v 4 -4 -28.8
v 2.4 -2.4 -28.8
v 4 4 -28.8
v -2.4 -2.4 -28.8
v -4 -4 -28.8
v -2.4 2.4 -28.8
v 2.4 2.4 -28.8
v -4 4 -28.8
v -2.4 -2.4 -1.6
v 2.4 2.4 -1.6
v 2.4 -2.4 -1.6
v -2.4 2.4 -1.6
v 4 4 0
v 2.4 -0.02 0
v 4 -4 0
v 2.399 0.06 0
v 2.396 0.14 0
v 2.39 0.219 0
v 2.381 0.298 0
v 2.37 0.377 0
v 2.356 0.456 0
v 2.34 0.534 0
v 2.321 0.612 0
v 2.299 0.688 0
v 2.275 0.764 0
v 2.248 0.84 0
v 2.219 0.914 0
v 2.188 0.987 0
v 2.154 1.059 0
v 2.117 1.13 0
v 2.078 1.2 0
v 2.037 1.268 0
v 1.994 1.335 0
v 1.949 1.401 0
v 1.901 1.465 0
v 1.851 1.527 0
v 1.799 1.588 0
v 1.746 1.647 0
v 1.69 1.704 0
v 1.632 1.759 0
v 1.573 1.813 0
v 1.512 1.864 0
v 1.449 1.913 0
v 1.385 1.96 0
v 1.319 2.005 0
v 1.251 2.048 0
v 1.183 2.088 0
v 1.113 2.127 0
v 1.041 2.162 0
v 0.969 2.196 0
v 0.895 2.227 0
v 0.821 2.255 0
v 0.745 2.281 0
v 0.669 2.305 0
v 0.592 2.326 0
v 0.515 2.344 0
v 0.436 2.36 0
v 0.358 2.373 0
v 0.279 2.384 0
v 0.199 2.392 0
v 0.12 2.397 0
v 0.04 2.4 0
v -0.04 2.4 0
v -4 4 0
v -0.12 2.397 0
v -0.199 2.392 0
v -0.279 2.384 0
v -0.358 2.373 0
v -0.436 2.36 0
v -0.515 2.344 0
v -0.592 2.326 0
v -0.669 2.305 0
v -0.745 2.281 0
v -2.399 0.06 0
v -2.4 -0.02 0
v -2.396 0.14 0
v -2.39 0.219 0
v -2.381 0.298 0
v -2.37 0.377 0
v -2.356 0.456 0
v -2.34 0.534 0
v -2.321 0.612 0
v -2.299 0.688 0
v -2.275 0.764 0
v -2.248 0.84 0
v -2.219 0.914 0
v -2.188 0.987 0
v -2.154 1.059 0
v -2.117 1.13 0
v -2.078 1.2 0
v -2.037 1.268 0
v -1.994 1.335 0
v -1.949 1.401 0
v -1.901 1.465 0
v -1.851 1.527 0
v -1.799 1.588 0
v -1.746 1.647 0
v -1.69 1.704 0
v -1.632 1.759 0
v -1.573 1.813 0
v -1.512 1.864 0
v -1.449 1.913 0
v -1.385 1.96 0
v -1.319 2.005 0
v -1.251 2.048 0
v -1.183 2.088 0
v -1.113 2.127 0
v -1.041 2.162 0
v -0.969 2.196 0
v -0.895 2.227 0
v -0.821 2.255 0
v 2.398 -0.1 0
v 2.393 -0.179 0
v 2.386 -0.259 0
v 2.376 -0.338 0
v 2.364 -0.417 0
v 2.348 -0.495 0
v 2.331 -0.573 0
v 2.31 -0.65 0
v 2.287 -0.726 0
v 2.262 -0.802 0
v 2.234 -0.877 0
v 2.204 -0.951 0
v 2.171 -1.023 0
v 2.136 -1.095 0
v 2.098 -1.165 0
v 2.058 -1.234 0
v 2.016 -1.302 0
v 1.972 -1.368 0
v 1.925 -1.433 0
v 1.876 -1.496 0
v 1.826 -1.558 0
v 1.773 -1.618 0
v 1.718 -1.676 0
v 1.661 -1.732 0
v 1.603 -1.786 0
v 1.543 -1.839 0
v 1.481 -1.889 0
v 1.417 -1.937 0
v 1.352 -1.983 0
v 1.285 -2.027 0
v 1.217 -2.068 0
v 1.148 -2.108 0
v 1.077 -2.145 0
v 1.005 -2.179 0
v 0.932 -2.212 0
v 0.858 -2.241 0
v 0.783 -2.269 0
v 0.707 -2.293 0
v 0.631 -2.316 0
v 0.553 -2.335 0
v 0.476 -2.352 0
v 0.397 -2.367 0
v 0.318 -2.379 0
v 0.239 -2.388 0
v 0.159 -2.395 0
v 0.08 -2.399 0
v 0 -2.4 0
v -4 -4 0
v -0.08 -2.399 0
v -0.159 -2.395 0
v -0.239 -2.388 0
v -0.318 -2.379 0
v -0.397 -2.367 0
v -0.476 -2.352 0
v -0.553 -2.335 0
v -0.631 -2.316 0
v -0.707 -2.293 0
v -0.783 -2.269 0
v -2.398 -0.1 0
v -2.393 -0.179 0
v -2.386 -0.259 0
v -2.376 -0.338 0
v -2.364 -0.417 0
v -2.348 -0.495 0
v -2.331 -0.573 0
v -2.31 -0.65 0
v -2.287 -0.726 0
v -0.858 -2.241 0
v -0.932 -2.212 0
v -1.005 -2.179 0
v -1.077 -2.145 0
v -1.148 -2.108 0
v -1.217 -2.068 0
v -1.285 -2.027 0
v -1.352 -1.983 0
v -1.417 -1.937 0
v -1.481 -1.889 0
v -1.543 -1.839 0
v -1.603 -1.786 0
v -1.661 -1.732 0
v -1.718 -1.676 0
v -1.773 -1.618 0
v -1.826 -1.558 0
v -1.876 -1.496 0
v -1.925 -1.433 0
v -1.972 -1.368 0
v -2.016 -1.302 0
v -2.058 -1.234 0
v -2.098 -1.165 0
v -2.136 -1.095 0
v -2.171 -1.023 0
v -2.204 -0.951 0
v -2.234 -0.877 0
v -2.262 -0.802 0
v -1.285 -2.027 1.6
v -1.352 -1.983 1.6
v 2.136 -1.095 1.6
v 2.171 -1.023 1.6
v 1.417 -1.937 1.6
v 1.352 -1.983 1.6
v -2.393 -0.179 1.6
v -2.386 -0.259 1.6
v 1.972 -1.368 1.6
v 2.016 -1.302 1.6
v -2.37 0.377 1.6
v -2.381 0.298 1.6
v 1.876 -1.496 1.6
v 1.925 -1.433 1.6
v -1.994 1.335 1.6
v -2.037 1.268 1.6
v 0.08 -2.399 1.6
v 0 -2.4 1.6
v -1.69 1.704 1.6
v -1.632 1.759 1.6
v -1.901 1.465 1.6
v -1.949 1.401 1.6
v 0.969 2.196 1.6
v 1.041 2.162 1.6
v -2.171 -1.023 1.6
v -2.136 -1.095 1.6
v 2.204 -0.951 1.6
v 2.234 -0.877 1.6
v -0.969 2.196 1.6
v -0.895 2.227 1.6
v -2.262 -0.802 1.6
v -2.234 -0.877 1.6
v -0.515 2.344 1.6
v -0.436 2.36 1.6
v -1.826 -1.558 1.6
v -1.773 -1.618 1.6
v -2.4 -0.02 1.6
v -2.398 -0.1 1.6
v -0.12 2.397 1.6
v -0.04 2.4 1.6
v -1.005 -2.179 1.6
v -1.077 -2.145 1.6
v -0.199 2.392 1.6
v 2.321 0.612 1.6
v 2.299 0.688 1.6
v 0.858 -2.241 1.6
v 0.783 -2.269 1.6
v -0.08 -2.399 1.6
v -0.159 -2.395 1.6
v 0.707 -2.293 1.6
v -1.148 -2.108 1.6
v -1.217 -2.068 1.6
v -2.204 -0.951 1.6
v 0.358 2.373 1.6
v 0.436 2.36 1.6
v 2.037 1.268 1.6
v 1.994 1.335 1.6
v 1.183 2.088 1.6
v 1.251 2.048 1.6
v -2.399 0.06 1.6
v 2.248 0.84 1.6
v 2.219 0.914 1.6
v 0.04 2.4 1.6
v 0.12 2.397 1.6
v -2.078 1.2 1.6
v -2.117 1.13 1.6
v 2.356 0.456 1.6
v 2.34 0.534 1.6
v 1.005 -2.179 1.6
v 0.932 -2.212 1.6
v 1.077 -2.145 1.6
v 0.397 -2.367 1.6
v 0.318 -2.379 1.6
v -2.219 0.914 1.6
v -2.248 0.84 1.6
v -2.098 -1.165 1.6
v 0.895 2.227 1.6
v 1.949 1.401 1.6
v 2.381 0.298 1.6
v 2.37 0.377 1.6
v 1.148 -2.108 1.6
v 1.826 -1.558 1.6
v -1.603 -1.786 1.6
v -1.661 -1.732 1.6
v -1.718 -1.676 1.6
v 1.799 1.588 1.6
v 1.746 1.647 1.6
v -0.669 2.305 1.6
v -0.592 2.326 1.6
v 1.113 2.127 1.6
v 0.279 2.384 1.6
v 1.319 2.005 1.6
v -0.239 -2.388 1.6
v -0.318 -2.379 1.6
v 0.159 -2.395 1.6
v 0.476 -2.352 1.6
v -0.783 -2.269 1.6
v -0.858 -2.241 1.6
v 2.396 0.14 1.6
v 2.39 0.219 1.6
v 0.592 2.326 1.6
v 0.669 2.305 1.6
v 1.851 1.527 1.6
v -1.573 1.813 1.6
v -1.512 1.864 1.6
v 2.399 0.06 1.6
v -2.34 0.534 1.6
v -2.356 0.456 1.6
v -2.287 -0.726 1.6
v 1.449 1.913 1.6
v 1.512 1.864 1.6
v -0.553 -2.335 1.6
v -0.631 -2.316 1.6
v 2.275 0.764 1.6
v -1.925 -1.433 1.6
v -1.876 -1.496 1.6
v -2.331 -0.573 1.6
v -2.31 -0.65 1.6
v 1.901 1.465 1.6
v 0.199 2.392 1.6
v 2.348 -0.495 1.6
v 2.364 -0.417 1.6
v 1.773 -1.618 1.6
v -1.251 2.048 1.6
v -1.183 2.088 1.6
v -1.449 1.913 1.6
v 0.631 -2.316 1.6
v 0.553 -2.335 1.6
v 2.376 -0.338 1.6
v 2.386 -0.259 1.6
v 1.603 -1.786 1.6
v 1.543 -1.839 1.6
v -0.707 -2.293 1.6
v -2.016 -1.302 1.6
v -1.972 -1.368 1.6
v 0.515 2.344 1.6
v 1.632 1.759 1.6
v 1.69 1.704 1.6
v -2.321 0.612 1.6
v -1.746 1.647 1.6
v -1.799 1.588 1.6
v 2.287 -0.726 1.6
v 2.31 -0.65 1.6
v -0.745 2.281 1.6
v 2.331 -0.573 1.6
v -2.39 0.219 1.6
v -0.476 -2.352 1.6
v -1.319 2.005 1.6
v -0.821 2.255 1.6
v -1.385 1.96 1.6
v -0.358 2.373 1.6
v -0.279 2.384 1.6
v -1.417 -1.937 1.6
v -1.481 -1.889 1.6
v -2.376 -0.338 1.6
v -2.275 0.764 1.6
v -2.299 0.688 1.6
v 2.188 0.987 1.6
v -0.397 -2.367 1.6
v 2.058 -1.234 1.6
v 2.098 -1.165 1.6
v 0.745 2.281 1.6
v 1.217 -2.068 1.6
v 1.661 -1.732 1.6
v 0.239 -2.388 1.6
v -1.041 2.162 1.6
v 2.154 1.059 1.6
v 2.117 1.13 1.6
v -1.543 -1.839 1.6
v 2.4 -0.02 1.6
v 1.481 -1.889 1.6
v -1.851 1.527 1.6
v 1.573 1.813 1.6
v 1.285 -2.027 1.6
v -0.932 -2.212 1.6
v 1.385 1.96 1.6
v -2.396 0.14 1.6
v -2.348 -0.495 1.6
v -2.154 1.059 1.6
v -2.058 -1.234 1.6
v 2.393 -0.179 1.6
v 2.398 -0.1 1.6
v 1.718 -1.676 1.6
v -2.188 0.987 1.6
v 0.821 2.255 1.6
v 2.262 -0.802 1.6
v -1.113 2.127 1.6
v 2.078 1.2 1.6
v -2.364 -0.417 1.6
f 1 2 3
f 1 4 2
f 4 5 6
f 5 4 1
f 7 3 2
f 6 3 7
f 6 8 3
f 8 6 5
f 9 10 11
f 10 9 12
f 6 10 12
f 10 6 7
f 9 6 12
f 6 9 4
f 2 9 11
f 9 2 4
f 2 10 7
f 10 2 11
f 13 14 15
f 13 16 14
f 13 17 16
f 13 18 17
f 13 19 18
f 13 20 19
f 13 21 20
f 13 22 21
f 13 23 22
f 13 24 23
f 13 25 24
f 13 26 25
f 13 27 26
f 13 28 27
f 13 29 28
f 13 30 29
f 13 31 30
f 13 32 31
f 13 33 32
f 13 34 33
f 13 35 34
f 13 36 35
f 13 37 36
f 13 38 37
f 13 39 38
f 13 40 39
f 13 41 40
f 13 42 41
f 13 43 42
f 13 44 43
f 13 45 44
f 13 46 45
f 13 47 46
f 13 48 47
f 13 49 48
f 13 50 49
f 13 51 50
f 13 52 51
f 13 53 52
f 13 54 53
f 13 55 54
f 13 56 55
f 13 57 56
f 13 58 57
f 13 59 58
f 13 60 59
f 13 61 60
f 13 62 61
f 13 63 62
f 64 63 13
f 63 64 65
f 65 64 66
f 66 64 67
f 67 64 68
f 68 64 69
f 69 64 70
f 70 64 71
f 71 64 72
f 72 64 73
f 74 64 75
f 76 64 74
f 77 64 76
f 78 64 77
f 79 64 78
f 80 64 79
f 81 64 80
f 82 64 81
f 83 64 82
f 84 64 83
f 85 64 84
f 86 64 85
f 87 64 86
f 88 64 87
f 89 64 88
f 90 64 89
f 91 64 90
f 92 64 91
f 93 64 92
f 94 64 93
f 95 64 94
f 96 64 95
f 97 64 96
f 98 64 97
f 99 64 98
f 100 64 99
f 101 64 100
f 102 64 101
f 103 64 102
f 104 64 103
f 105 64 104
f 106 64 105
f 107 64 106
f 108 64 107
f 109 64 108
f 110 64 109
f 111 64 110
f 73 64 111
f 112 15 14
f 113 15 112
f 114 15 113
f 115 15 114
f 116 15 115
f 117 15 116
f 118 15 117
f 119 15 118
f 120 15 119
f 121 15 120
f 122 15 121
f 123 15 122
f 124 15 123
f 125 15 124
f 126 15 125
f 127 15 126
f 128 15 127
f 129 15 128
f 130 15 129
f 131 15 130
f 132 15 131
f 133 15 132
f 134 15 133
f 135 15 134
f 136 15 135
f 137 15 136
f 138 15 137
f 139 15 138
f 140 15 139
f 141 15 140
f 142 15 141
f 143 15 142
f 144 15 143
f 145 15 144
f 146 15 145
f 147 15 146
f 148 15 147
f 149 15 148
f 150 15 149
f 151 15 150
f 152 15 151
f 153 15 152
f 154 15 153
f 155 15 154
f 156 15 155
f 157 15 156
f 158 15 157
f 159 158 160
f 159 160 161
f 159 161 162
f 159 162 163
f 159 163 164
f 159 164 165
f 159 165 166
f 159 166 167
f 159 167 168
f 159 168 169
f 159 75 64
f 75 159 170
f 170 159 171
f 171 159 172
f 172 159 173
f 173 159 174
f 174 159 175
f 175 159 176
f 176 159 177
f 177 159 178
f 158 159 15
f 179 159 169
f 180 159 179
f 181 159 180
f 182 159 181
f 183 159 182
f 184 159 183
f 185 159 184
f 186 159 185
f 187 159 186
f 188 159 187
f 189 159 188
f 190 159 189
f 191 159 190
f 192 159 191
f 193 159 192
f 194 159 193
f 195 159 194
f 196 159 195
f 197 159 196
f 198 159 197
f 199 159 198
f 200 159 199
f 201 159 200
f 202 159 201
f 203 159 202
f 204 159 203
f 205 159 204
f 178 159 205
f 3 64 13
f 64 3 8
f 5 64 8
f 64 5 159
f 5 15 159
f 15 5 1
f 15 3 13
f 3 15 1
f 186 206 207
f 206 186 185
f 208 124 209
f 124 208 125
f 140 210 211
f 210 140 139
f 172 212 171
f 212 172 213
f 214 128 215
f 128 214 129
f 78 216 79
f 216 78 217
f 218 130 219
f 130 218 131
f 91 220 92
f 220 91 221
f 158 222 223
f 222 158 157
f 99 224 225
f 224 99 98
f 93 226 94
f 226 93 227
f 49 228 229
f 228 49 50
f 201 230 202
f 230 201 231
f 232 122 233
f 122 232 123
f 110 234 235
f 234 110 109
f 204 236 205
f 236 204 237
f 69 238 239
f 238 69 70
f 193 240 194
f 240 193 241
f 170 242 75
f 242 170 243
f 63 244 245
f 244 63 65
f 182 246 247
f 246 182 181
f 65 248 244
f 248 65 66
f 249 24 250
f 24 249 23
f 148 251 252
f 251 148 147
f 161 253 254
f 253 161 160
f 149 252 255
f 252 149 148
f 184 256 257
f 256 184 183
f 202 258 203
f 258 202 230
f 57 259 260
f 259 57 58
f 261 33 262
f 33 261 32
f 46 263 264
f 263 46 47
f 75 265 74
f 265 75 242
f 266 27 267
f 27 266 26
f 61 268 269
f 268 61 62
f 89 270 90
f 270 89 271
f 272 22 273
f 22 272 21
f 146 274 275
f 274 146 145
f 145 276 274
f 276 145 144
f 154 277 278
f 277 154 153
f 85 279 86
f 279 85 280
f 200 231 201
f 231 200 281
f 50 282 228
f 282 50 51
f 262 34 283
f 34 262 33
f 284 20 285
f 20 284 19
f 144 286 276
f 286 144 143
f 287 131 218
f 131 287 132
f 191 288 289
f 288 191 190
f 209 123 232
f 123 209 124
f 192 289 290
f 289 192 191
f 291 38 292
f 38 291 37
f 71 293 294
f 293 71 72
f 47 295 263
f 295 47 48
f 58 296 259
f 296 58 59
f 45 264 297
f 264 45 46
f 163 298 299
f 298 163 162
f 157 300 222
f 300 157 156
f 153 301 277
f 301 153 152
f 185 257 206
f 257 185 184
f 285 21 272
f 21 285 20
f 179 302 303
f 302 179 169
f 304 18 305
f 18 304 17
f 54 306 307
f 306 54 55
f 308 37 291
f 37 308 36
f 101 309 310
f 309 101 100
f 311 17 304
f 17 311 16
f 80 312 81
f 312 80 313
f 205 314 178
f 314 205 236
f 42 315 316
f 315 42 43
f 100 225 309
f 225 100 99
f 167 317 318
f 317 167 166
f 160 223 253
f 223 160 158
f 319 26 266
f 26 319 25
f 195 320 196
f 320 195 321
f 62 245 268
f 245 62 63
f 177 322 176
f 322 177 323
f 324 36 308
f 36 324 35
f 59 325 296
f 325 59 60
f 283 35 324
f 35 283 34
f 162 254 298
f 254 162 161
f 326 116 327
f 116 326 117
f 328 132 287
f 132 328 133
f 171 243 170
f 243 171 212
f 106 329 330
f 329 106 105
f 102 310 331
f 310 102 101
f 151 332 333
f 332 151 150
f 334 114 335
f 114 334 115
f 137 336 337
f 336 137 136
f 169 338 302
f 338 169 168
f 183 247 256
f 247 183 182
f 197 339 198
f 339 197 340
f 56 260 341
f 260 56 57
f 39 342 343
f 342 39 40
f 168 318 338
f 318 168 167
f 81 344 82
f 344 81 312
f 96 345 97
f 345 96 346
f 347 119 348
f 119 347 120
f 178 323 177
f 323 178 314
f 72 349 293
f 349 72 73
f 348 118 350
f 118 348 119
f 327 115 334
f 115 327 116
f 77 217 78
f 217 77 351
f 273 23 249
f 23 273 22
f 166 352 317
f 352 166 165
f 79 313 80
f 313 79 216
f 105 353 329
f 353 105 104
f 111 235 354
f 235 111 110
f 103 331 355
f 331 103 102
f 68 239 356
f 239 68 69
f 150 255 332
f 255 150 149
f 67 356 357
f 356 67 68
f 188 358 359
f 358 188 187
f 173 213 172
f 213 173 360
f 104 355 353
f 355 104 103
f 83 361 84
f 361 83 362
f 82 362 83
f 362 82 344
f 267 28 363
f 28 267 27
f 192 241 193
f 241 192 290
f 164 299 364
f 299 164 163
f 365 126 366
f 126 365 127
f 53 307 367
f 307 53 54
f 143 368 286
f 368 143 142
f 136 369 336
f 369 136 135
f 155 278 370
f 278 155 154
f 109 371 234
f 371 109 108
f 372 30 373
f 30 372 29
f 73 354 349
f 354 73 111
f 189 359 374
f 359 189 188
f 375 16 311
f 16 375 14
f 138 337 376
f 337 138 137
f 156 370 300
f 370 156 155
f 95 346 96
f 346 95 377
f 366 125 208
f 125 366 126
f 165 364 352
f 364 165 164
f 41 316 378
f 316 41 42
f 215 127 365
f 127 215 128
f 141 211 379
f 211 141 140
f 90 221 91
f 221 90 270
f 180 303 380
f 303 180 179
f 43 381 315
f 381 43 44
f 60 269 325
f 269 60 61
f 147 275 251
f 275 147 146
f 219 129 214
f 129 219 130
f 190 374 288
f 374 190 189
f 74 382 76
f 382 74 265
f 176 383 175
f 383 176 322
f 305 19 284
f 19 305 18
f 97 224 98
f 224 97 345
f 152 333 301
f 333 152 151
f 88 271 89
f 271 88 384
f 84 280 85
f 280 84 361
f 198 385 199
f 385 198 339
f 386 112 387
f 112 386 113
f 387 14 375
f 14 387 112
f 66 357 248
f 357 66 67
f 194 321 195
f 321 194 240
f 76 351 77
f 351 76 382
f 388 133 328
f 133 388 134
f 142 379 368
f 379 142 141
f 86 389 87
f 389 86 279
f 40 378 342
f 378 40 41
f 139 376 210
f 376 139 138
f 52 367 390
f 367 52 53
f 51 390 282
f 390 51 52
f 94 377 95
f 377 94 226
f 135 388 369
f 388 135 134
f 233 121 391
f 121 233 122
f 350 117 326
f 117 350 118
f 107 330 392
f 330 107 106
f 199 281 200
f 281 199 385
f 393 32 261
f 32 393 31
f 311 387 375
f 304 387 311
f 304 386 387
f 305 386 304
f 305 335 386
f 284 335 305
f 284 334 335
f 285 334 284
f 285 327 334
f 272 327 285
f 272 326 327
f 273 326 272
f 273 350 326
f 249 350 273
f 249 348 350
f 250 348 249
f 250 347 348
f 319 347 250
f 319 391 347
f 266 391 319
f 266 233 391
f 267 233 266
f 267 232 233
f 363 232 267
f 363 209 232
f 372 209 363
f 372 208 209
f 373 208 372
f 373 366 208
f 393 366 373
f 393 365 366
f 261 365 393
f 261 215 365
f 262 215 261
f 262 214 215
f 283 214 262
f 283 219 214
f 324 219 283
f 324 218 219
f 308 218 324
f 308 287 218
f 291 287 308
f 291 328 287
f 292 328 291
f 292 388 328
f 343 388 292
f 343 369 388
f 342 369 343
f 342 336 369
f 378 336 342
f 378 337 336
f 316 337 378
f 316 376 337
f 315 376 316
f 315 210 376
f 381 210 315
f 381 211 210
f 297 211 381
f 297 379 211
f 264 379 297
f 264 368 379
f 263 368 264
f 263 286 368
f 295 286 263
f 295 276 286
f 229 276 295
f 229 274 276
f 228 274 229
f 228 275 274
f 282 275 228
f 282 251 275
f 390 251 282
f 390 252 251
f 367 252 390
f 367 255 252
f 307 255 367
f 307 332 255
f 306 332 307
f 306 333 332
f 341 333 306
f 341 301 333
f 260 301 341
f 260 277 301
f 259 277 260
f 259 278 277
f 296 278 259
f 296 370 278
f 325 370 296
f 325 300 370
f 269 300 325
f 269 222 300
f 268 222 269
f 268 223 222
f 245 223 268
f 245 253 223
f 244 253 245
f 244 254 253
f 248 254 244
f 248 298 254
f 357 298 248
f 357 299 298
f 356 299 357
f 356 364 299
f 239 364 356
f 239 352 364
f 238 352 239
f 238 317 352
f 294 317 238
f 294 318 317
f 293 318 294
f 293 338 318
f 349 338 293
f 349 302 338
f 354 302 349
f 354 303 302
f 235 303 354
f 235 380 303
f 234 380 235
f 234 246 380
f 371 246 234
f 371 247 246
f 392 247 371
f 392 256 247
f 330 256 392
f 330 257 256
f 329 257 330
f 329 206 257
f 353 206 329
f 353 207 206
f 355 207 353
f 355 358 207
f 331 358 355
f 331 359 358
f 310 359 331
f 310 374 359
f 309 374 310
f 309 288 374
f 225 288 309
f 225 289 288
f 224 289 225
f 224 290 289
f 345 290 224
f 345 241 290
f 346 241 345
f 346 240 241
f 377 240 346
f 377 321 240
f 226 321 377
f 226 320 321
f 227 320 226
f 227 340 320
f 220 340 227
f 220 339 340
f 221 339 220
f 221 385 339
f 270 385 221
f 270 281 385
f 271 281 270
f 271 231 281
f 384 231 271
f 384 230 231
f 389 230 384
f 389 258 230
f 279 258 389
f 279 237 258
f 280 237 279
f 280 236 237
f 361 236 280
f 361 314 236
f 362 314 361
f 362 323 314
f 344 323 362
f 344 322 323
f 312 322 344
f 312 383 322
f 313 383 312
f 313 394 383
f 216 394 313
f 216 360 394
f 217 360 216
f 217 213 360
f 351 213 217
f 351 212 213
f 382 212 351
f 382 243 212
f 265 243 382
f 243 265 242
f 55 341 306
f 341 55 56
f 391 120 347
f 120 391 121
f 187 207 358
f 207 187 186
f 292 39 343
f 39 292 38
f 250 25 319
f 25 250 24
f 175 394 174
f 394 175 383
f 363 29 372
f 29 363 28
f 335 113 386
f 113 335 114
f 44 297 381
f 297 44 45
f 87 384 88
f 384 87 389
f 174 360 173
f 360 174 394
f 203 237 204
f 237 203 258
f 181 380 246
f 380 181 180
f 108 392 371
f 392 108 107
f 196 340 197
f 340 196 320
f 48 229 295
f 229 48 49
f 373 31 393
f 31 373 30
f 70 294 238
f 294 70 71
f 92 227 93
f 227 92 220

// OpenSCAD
// file: ../p/stud3.scad
use <../lib.scad>
use <4-4cyli.scad>
use <4-4disc.scad>
use <4-4edge.scad>
$fa=1; $fs=0.2;
function ldraw_lib__stud3(realsolid=false) = realsolid ? 
    [openscad(translate([0,0,-eps()], o=cylinder(4+eps(), r=4)),2)] : [
// 0 Stud Tube Solid
// 0 Name: stud3.dat
// 0 Author: James Jessiman
// 0 !LDRAW_ORG Primitive UPDATE 2012-01
// 0 !LICENSE Licensed under CC BY 2.0 and CC BY 4.0 : see CAreadme.txt
// 
// 0 BFC CERTIFY CCW
  [0,"BFC","CERTIFY"],
  [0,"BFC","CCW"],
// 
// 0 !HISTORY 2002-04-04 [sbliss] Modified for BFC compliance
// 0 !HISTORY 2002-04-25 [PTadmin] Official Update 2002-02
// 0 !HISTORY 2007-06-24 [PTadmin] Header formatted for Contributor Agreement
// 0 !HISTORY 2008-07-01 [PTadmin] Official Update 2008-01
// 0 !HISTORY 2012-02-16 [Philo] Changed to CCW
// 0 !HISTORY 2012-03-30 [PTadmin] Official Update 2012-01
// 
// 
// 1 16 0 -4 0 4 0 0 0 1 0 0 0 4 4-4edge.dat
  [1,16,0,-4,0,4,0,0,0,1,0,0,0,4, ldraw_lib__4_4edge(realsolid)],
// 1 16 0 0 0 4 0 0 0 1 0 0 0 4 4-4edge.dat
  [1,16,0,0,0,4,0,0,0,1,0,0,0,4, ldraw_lib__4_4edge(realsolid)],
// 1 16 0 -4 0 4 0 0 0 1 0 0 0 4 4-4disc.dat
  [1,16,0,-4,0,4,0,0,0,1,0,0,0,4, ldraw_lib__4_4disc(realsolid)],
// 1 16 0 -4 0 4 0 0 0 4 0 0 0 4 4-4cyli.dat
  [1,16,0,-4,0,4,0,0,0,4,0,0,0,4, ldraw_lib__4_4cyli(realsolid)],
];
module ldraw_lib__stud3(step=0, col=false, unit=2/5, alt=false, line=0.2, solid=!$preview)
    makepoly(ldraw_lib__stud3(solid), step=step, col=col, unit=unit, alt=alt, line=line, solid=solid);
ldraw_lib__stud3(line=0.2);
// file: ../p/box4t.scad
use <../lib.scad>
$fa=1; $fs=0.2;
function ldraw_lib__box4t(realsolid=false) = [
// 0 Box with 4 Adjacent Faces and All Edges
// 0 Name: box4t.dat
// 0 Author: Tore Eriksson [Tore_Eriksson]
// 0 !LDRAW_ORG Primitive UPDATE 2003-02
// 0 !LICENSE Licensed under CC BY 2.0 and CC BY 4.0 : see CAreadme.txt
// 
// 0 BFC CERTIFY CCW
  [0,"BFC","CERTIFY"],
  [0,"BFC","CCW"],
// 
// 0 !HISTORY 1997-09-29 [PTadmin] Official Update 1997-15
// 0 !HISTORY 2002-08-31 [izanette] Modified with WINDZ for BFC compliance
// 0 !HISTORY 2003-08-01 [PTadmin] Official Update 2003-02
// 0 !HISTORY 2007-06-24 [PTadmin] Header formatted for Contributor Agreement
// 0 !HISTORY 2008-07-01 [PTadmin] Official Update 2008-01
// 
// 
// 2 24 1 1 1 -1 1 1
  [2,24,1,1,1,-1,1,1],
// 2 24 -1 1 1 -1 1 -1
  [2,24,-1,1,1,-1,1,-1],
// 2 24 -1 1 -1 1 1 -1
  [2,24,-1,1,-1,1,1,-1],
// 2 24 1 1 -1 1 1 1
  [2,24,1,1,-1,1,1,1],
// 2 24 1 0 1 -1 0 1
  [2,24,1,0,1,-1,0,1],
// 2 24 -1 0 1 -1 0 -1
  [2,24,-1,0,1,-1,0,-1],
// 2 24 -1 0 -1 1 0 -1
  [2,24,-1,0,-1,1,0,-1],
// 2 24 1 0 -1 1 0 1
  [2,24,1,0,-1,1,0,1],
// 2 24 1 0 1 1 1 1
  [2,24,1,0,1,1,1,1],
// 2 24 -1 0 1 -1 1 1
  [2,24,-1,0,1,-1,1,1],
// 2 24 1 0 -1 1 1 -1
  [2,24,1,0,-1,1,1,-1],
// 2 24 -1 0 -1 -1 1 -1
  [2,24,-1,0,-1,-1,1,-1],
// 4 16 1 1 1 1 1 -1 -1 1 -1 -1 1 1
  [4,16,1,1,1,1,1,-1,-1,1,-1,-1,1,1],
// 4 16 1 1 1 -1 1 1 -1 0 1 1 0 1
  [4,16,1,1,1,-1,1,1,-1,0,1,1,0,1],
// 4 16 -1 1 1 -1 1 -1 -1 0 -1 -1 0 1
  [4,16,-1,1,1,-1,1,-1,-1,0,-1,-1,0,1],
// 0 4 16 -1 1 -1 -1 0 -1 1 0 -1 1 1 -1
// 4 16 1 1 -1 1 1 1 1 0 1 1 0 -1
  [4,16,1,1,-1,1,1,1,1,0,1,1,0,-1],
// 0
];
module ldraw_lib__box4t(step=0, col=false, unit=2/5, alt=false, line=0.2, solid=!$preview)
    makepoly(ldraw_lib__box4t(solid), step=step, col=col, unit=unit, alt=alt, line=line, solid=solid);
ldraw_lib__box4t(line=0.2);
// file: s/3004s01.scad
use <../../lib.scad>
use <../../p/box4t.scad>
use <../../p/box5.scad>
use <../../p/stud.scad>
use <../../p/stud3.scad>
$fa=1; $fs=0.2;
function ldraw_lib__s__3004s01(realsolid=false) = [
// 0 ~Brick  1 x  2 without Front Face
// 0 Name: s\3004s01.dat
// 0 Author: James Jessiman
// 0 !LDRAW_ORG Subpart UPDATE 2003-03
// 0 !LICENSE Licensed under CC BY 2.0 and CC BY 4.0 : see CAreadme.txt
// 
// 0 BFC CERTIFY CCW
  [0,"BFC","CERTIFY"],
  [0,"BFC","CCW"],
// 
// 0 !HISTORY 2003-09-07 [jriley] Subfiling, BFC
// 0 !HISTORY 2003-12-19 [PTadmin] Official Update 2003-03
// 0 !HISTORY 2007-08-29 [PTadmin] Header formatted for Contributor Agreement
// 0 !HISTORY 2008-07-01 [PTadmin] Official Update 2008-01
// 
// 
// 1 16 0 4 0 1 0 0 0 -5 0 0 0 1 stud3.dat
  [1,16,0,4,0,1,0,0,0,-5,0,0,0,1, ldraw_lib__stud3(realsolid)],
// 0 BFC INVERTNEXT
  [0,"BFC","INVERTNEXT"],
// 1 16 0 24 0 16 0 0 0 -20 0 0 0 6 box5.dat
  [1,16,0,24,0,16,0,0,0,-20,0,0,0,6, ldraw_lib__box5(realsolid)],
// 4 16 20 24 10 16 24 6 -16 24 6 -20 24 10
  [4,16,20,24,10,16,24,6,-16,24,6,-20,24,10],
// 4 16 -20 24 10 -16 24 6 -16 24 -6 -20 24 -10
  [4,16,-20,24,10,-16,24,6,-16,24,-6,-20,24,-10],
// 4 16 -20 24 -10 -16 24 -6 16 24 -6 20 24 -10
  [4,16,-20,24,-10,-16,24,-6,16,24,-6,20,24,-10],
// 4 16 20 24 -10 16 24 -6 16 24 6 20 24 10
  [4,16,20,24,-10,16,24,-6,16,24,6,20,24,10],
// 1 16 0 24 0 20 0 0 0 -24 0 0 0 10 box4t.dat
  [1,16,0,24,0,20,0,0,0,-24,0,0,0,10, ldraw_lib__box4t(realsolid)],
// 1 16 10 0 0 1 0 0 0 1 0 0 0 1 stud.dat
  [1,16,10,0,0,1,0,0,0,1,0,0,0,1, ldraw_lib__stud(realsolid)],
// 1 16 -10 0 0 1 0 0 0 1 0 0 0 1 stud.dat
  [1,16,-10,0,0,1,0,0,0,1,0,0,0,1, ldraw_lib__stud(realsolid)],
// 0
];
module ldraw_lib__s__3004s01(step=0, col=false, unit=2/5, alt=false, line=0.2, solid=!$preview)
    makepoly(ldraw_lib__s__3004s01(solid), step=step, col=col, unit=unit, alt=alt, line=line, solid=solid);
ldraw_lib__s__3004s01(line=0.2);
// file: ../p/4-4edge.scad
use <../lib.scad>
$fa=1; $fs=0.2;
function ldraw_lib__4_4edge(realsolid=false) = [
// 0 Circle 1.0
// 0 Name: 4-4edge.dat
// 0 Author: James Jessiman
// 0 !LDRAW_ORG Primitive UPDATE 2017-01
// 0 !LICENSE Licensed under CC BY 2.0 and CC BY 4.0 : see CAreadme.txt
// 
// 0 BFC CERTIFY CCW
  [0,"BFC","CERTIFY"],
  [0,"BFC","CCW"],
// 
// 0 !HISTORY 1998-12-15 [PTadmin] Official Update 1998-10
// 0 !HISTORY 2005-12-28 [PTadmin] Official Update 2005-01
// 0 !HISTORY 2007-06-24 [PTadmin] Header formatted for Contributor Agreement
// 0 !HISTORY 2008-07-01 [PTadmin] Official Update 2008-01
// 0 !HISTORY 2017-01-15 [Steffen] BFCed
// 0 !HISTORY 2017-12-30 [PTadmin] Official Update 2017-01
// 
// 
// 2 24 1 0 0 0.9239 0 0.3827
  [2,24,1,0,0,0.9239,0,0.3827],
// 2 24 0.9239 0 0.3827 0.7071 0 0.7071
  [2,24,0.9239,0,0.3827,0.7071,0,0.7071],
// 2 24 0.7071 0 0.7071 0.3827 0 0.9239
  [2,24,0.7071,0,0.7071,0.3827,0,0.9239],
// 2 24 0.3827 0 0.9239 0 0 1
  [2,24,0.3827,0,0.9239,0,0,1],
// 2 24 0 0 1 -0.3827 0 0.9239
  [2,24,0,0,1,-0.3827,0,0.9239],
// 2 24 -0.3827 0 0.9239 -0.7071 0 0.7071
  [2,24,-0.3827,0,0.9239,-0.7071,0,0.7071],
// 2 24 -0.7071 0 0.7071 -0.9239 0 0.3827
  [2,24,-0.7071,0,0.7071,-0.9239,0,0.3827],
// 2 24 -0.9239 0 0.3827 -1 0 -0
  [2,24,-0.9239,0,0.3827,-1,0,-0],
// 2 24 -1 0 -0 -0.9239 0 -0.3827
  [2,24,-1,0,-0,-0.9239,0,-0.3827],
// 2 24 -0.9239 0 -0.3827 -0.7071 0 -0.7071
  [2,24,-0.9239,0,-0.3827,-0.7071,0,-0.7071],
// 2 24 -0.7071 0 -0.7071 -0.3827 0 -0.9239
  [2,24,-0.7071,0,-0.7071,-0.3827,0,-0.9239],
// 2 24 -0.3827 0 -0.9239 0 0 -1
  [2,24,-0.3827,0,-0.9239,0,0,-1],
// 2 24 0 0 -1 0.3827 0 -0.9239
  [2,24,0,0,-1,0.3827,0,-0.9239],
// 2 24 0.3827 0 -0.9239 0.7071 0 -0.7071
  [2,24,0.3827,0,-0.9239,0.7071,0,-0.7071],
// 2 24 0.7071 0 -0.7071 0.9239 0 -0.3827
  [2,24,0.7071,0,-0.7071,0.9239,0,-0.3827],
// 2 24 0.9239 0 -0.3827 1 0 0
  [2,24,0.9239,0,-0.3827,1,0,0],
];
module ldraw_lib__4_4edge(step=0, col=false, unit=2/5, alt=false, line=0.2, solid=!$preview)
    makepoly(ldraw_lib__4_4edge(solid), step=step, col=col, unit=unit, alt=alt, line=line, solid=solid);
ldraw_lib__4_4edge(line=0.2);
// file: ../p/4-4disc.scad
use <../lib.scad>
$fa=1; $fs=0.2;
function ldraw_lib__4_4disc(realsolid=false) = [
// 0 Disc 1.0
// 0 Name: 4-4disc.dat
// 0 Author: James Jessiman
// 0 !LDRAW_ORG Primitive UPDATE 2002-02
// 0 !LICENSE Licensed under CC BY 2.0 and CC BY 4.0 : see CAreadme.txt
// 
// 0 BFC CERTIFY CCW
  [0,"BFC","CERTIFY"],
  [0,"BFC","CCW"],
// 
// 0 !HISTORY 1998-12-15 [PTadmin] Official Update 1998-10
// 0 !HISTORY 2002-03-23 [sbliss] Added BFC statement
// 0 !HISTORY 2002-04-25 [PTadmin] Official Update 2002-02
// 0 !HISTORY 2007-06-24 [PTadmin] Header formatted for Contributor Agreement
// 0 !HISTORY 2008-07-01 [PTadmin] Official Update 2008-01
// 
// 
// 3 16 0 0 0 1 0 0 0.9239 0 0.3827
  [3,16,0,0,0,1,0,0,0.9239,0,0.3827],
// 3 16 0 0 0 0.9239 0 0.3827 0.7071 0 0.7071
  [3,16,0,0,0,0.9239,0,0.3827,0.7071,0,0.7071],
// 3 16 0 0 0 0.7071 0 0.7071 0.3827 0 0.9239
  [3,16,0,0,0,0.7071,0,0.7071,0.3827,0,0.9239],
// 3 16 0 0 0 0.3827 0 0.9239 0 0 1
  [3,16,0,0,0,0.3827,0,0.9239,0,0,1],
// 3 16 0 0 0 0 0 1 -0.3827 0 0.9239
  [3,16,0,0,0,0,0,1,-0.3827,0,0.9239],
// 3 16 0 0 0 -0.3827 0 0.9239 -0.7071 0 0.7071
  [3,16,0,0,0,-0.3827,0,0.9239,-0.7071,0,0.7071],
// 3 16 0 0 0 -0.7071 0 0.7071 -0.9239 0 0.3827
  [3,16,0,0,0,-0.7071,0,0.7071,-0.9239,0,0.3827],
// 3 16 0 0 0 -0.9239 0 0.3827 -1 0 -0
  [3,16,0,0,0,-0.9239,0,0.3827,-1,0,-0],
// 3 16 0 0 0 -1 0 -0 -0.9239 0 -0.3827
  [3,16,0,0,0,-1,0,-0,-0.9239,0,-0.3827],
// 3 16 0 0 0 -0.9239 0 -0.3827 -0.7071 0 -0.7071
  [3,16,0,0,0,-0.9239,0,-0.3827,-0.7071,0,-0.7071],
// 3 16 0 0 0 -0.7071 0 -0.7071 -0.3827 0 -0.9239
  [3,16,0,0,0,-0.7071,0,-0.7071,-0.3827,0,-0.9239],
// 3 16 0 0 0 -0.3827 0 -0.9239 0 0 -1
  [3,16,0,0,0,-0.3827,0,-0.9239,0,0,-1],
// 3 16 0 0 0 0 0 -1 0.3827 0 -0.9239
  [3,16,0,0,0,0,0,-1,0.3827,0,-0.9239],
// 3 16 0 0 0 0.3827 0 -0.9239 0.7071 0 -0.7071
  [3,16,0,0,0,0.3827,0,-0.9239,0.7071,0,-0.7071],
// 3 16 0 0 0 0.7071 0 -0.7071 0.9239 0 -0.3827
  [3,16,0,0,0,0.7071,0,-0.7071,0.9239,0,-0.3827],
// 3 16 0 0 0 0.9239 0 -0.3827 1 0 0
  [3,16,0,0,0,0.9239,0,-0.3827,1,0,0],
// 0
];
module ldraw_lib__4_4disc(step=0, col=false, unit=2/5, alt=false, line=0.2, solid=!$preview)
    makepoly(ldraw_lib__4_4disc(solid), step=step, col=col, unit=unit, alt=alt, line=line, solid=solid);
ldraw_lib__4_4disc(line=0.2);
// file: ../p/4-4cyli.scad
use <../lib.scad>
$fa=1; $fs=0.2;
function ldraw_lib__4_4cyli(realsolid=false) = [
// 0 Cylinder 1.0
// 0 Name: 4-4cyli.dat
// 0 Author: James Jessiman
// 0 !LDRAW_ORG Primitive UPDATE 2005-01
// 0 !LICENSE Licensed under CC BY 2.0 and CC BY 4.0 : see CAreadme.txt
// 
// 0 BFC CERTIFY CCW
  [0,"BFC","CERTIFY"],
  [0,"BFC","CCW"],
// 
// 0 !HISTORY 1998-12-15 [PTadmin] Official Update 1998-10
// 0 !HISTORY 2002-03-23 [sbliss] Added BFC statement; merged headers from files in distributions LDraw 0.27 and Complete.
// 0 !HISTORY 2002-04-25 [PTadmin] Official Update 2002-02
// 0 !HISTORY 2004-12-14 [guyvivan] BFC CCW
// 0 !HISTORY 2005-12-28 [PTadmin] Official Update 2005-01
// 0 !HISTORY 2007-06-24 [PTadmin] Header formatted for Contributor Agreement
// 0 !HISTORY 2008-07-01 [PTadmin] Official Update 2008-01
// 
// 
// 4 16 1 1 0 0.9239 1 0.3827 0.9239 0 0.3827 1 0 0
  [4,16,1,1,0,0.9239,1,0.3827,0.9239,0,0.3827,1,0,0],
// 5 24 1 0 0 1 1 0 0.9239 0 0.3827 0.9239 0 -0.3827
  [5,24,1,0,0,1,1,0,0.9239,0,0.3827,0.9239,0,-0.3827],
// 4 16 0.9239 1 0.3827 0.7071 1 0.7071 0.7071 0 0.7071 0.9239 0 0.3827
  [4,16,0.9239,1,0.3827,0.7071,1,0.7071,0.7071,0,0.7071,0.9239,0,0.3827],
// 5 24 0.9239 0 0.3827 0.9239 1 0.3827 0.7071 0 0.7071 1 0 0
  [5,24,0.9239,0,0.3827,0.9239,1,0.3827,0.7071,0,0.7071,1,0,0],
// 4 16 0.7071 1 0.7071 0.3827 1 0.9239 0.3827 0 0.9239 0.7071 0 0.7071
  [4,16,0.7071,1,0.7071,0.3827,1,0.9239,0.3827,0,0.9239,0.7071,0,0.7071],
// 5 24 0.7071 0 0.7071 0.7071 1 0.7071 0.3827 0 0.9239 0.9239 0 0.3827
  [5,24,0.7071,0,0.7071,0.7071,1,0.7071,0.3827,0,0.9239,0.9239,0,0.3827],
// 4 16 0.3827 1 0.9239 0 1 1 0 0 1 0.3827 0 0.9239
  [4,16,0.3827,1,0.9239,0,1,1,0,0,1,0.3827,0,0.9239],
// 5 24 0.3827 0 0.9239 0.3827 1 0.9239 0 0 1 0.7071 0 0.7071
  [5,24,0.3827,0,0.9239,0.3827,1,0.9239,0,0,1,0.7071,0,0.7071],
// 4 16 0 1 1 -0.3827 1 0.9239 -0.3827 0 0.9239 0 0 1
  [4,16,0,1,1,-0.3827,1,0.9239,-0.3827,0,0.9239,0,0,1],
// 5 24 0 0 1 0 1 1 -0.3827 0 0.9239 0.3827 0 0.9239
  [5,24,0,0,1,0,1,1,-0.3827,0,0.9239,0.3827,0,0.9239],
// 4 16 -0.3827 1 0.9239 -0.7071 1 0.7071 -0.7071 0 0.7071 -0.3827 0 0.9239
  [4,16,-0.3827,1,0.9239,-0.7071,1,0.7071,-0.7071,0,0.7071,-0.3827,0,0.9239],
// 5 24 -0.3827 0 0.9239 -0.3827 1 0.9239 -0.7071 0 0.7071 0 0 1
  [5,24,-0.3827,0,0.9239,-0.3827,1,0.9239,-0.7071,0,0.7071,0,0,1],
// 4 16 -0.7071 1 0.7071 -0.9239 1 0.3827 -0.9239 0 0.3827 -0.7071 0 0.7071
  [4,16,-0.7071,1,0.7071,-0.9239,1,0.3827,-0.9239,0,0.3827,-0.7071,0,0.7071],
// 5 24 -0.7071 0 0.7071 -0.7071 1 0.7071 -0.9239 0 0.3827 -0.3827 0 0.9239
  [5,24,-0.7071,0,0.7071,-0.7071,1,0.7071,-0.9239,0,0.3827,-0.3827,0,0.9239],
// 4 16 -0.9239 1 0.3827 -1 1 0 -1 0 0 -0.9239 0 0.3827
  [4,16,-0.9239,1,0.3827,-1,1,0,-1,0,0,-0.9239,0,0.3827],
// 5 24 -0.9239 0 0.3827 -0.9239 1 0.3827 -1 0 0 -0.7071 0 0.7071
  [5,24,-0.9239,0,0.3827,-0.9239,1,0.3827,-1,0,0,-0.7071,0,0.7071],
// 4 16 -1 1 0 -0.9239 1 -0.3827 -0.9239 0 -0.3827 -1 0 0
  [4,16,-1,1,0,-0.9239,1,-0.3827,-0.9239,0,-0.3827,-1,0,0],
// 5 24 -1 0 0 -1 1 0 -0.9239 0 -0.3827 -0.9239 0 0.3827
  [5,24,-1,0,0,-1,1,0,-0.9239,0,-0.3827,-0.9239,0,0.3827],
// 4 16 -0.9239 1 -0.3827 -0.7071 1 -0.7071 -0.7071 0 -0.7071 -0.9239 0 -0.3827
  [4,16,-0.9239,1,-0.3827,-0.7071,1,-0.7071,-0.7071,0,-0.7071,-0.9239,0,-0.3827],
// 5 24 -0.9239 0 -0.3827 -0.9239 1 -0.3827 -0.7071 0 -0.7071 -1 0 0
  [5,24,-0.9239,0,-0.3827,-0.9239,1,-0.3827,-0.7071,0,-0.7071,-1,0,0],
// 4 16 -0.7071 1 -0.7071 -0.3827 1 -0.9239 -0.3827 0 -0.9239 -0.7071 0 -0.7071
  [4,16,-0.7071,1,-0.7071,-0.3827,1,-0.9239,-0.3827,0,-0.9239,-0.7071,0,-0.7071],
// 5 24 -0.7071 0 -0.7071 -0.7071 1 -0.7071 -0.3827 0 -0.9239 -0.9239 0 -0.3827
  [5,24,-0.7071,0,-0.7071,-0.7071,1,-0.7071,-0.3827,0,-0.9239,-0.9239,0,-0.3827],
// 4 16 -0.3827 1 -0.9239 0 1 -1 0 0 -1 -0.3827 0 -0.9239
  [4,16,-0.3827,1,-0.9239,0,1,-1,0,0,-1,-0.3827,0,-0.9239],
// 5 24 -0.3827 0 -0.9239 -0.3827 1 -0.9239 0 0 -1 -0.7071 0 -0.7071
  [5,24,-0.3827,0,-0.9239,-0.3827,1,-0.9239,0,0,-1,-0.7071,0,-0.7071],
// 4 16 0 1 -1 0.3827 1 -0.9239 0.3827 0 -0.9239 0 0 -1
  [4,16,0,1,-1,0.3827,1,-0.9239,0.3827,0,-0.9239,0,0,-1],
// 5 24 0 0 -1 0 1 -1 0.3827 0 -0.9239 -0.3827 0 -0.9239
  [5,24,0,0,-1,0,1,-1,0.3827,0,-0.9239,-0.3827,0,-0.9239],
// 4 16 0.3827 1 -0.9239 0.7071 1 -0.7071 0.7071 0 -0.7071 0.3827 0 -0.9239
  [4,16,0.3827,1,-0.9239,0.7071,1,-0.7071,0.7071,0,-0.7071,0.3827,0,-0.9239],
// 5 24 0.3827 0 -0.9239 0.3827 1 -0.9239 0.7071 0 -0.7071 0 0 -1
  [5,24,0.3827,0,-0.9239,0.3827,1,-0.9239,0.7071,0,-0.7071,0,0,-1],
// 4 16 0.7071 1 -0.7071 0.9239 1 -0.3827 0.9239 0 -0.3827 0.7071 0 -0.7071
  [4,16,0.7071,1,-0.7071,0.9239,1,-0.3827,0.9239,0,-0.3827,0.7071,0,-0.7071],
// 5 24 0.7071 0 -0.7071 0.7071 1 -0.7071 0.9239 0 -0.3827 0.3827 0 -0.9239
  [5,24,0.7071,0,-0.7071,0.7071,1,-0.7071,0.9239,0,-0.3827,0.3827,0,-0.9239],
// 4 16 0.9239 1 -0.3827 1 1 0 1 0 0 0.9239 0 -0.3827
  [4,16,0.9239,1,-0.3827,1,1,0,1,0,0,0.9239,0,-0.3827],
// 5 24 0.9239 0 -0.3827 0.9239 1 -0.3827 1 0 0 0.7071 0 -0.7071
  [5,24,0.9239,0,-0.3827,0.9239,1,-0.3827,1,0,0,0.7071,0,-0.7071],
// 0
];
module ldraw_lib__4_4cyli(step=0, col=false, unit=2/5, alt=false, line=0.2, solid=!$preview)
    makepoly(ldraw_lib__4_4cyli(solid), step=step, col=col, unit=unit, alt=alt, line=line, solid=solid);
ldraw_lib__4_4cyli(line=0.2);
// file: 3004.scad
use <../lib.scad>
use <s/3004s01.scad>
$fa=1; $fs=0.2;
function ldraw_lib__3004(realsolid=false) = [
// 0 Brick  1 x  2
// 0 Name: 3004.dat
// 0 Author: James Jessiman
// 0 !LDRAW_ORG Part UPDATE 2022-05
// 0 !LICENSE Licensed under CC BY 2.0 and CC BY 4.0 : see CAreadme.txt
// 
// 0 BFC CERTIFY CCW
  [0,"BFC","CERTIFY"],
  [0,"BFC","CCW"],
// 
// 0 !HISTORY 2001-10-26 [PTadmin] Official Update 2001-01
// 0 !HISTORY 2002-05-07 {unknown} BFC Certification
// 0 !HISTORY 2002-06-11 [PTadmin] Official Update 2002-03
// 0 !HISTORY 2007-05-07 [PTadmin] Header formatted for Contributor Agreement
// 0 !HISTORY 2008-07-01 [PTadmin] Official Update 2008-01
// 0 !HISTORY 2022-08-04 [MagFors] Using subfile
// 0 !HISTORY 2022-09-15 [PTadmin] Official Update 2022-05
// 
// 
// 1 16 0 0 0 1 0 0 0 1 0 0 0 1 s\3004s01.dat
  [1,16,0,0,0,1,0,0,0,1,0,0,0,1, ldraw_lib__s__3004s01(realsolid)],
// 4 16 -20 24 -10 20 24 -10 20 0 -10 -20 0 -10
  [4,16,-20,24,-10,20,24,-10,20,0,-10,-20,0,-10],
];
module ldraw_lib__3004(step=0, col=false, unit=2/5, alt=false, line=0.2, solid=!$preview)
    makepoly(ldraw_lib__3004(solid), step=step, col=col, unit=unit, alt=alt, line=line, solid=solid);
ldraw_lib__3004(line=0.2);
// file: ../p/stud.scad
use <../lib.scad>
use <4-4cyli.scad>
use <4-4disc.scad>
use <4-4edge.scad>
$fa=1; $fs=0.2;
function ldraw_lib__stud(realsolid=false) = realsolid ? 
    [openscad(translate([0,0,-eps()], o=cylinder(4+eps(), r=6)),2)] : [
// 0 Stud
// 0 Name: stud.dat
// 0 Author: James Jessiman
// 0 !LDRAW_ORG Primitive UPDATE 2012-01
// 0 !LICENSE Licensed under CC BY 2.0 and CC BY 4.0 : see CAreadme.txt
// 
// 0 BFC CERTIFY CCW
  [0,"BFC","CERTIFY"],
  [0,"BFC","CCW"],
// 
// 0 !HISTORY 2002-04-04 [sbliss] Modified for BFC compliance
// 0 !HISTORY 2002-04-25 [PTadmin] Official Update 2002-02
// 0 !HISTORY 2007-06-24 [PTadmin] Header formatted for Contributor Agreement
// 0 !HISTORY 2008-07-01 [PTadmin] Official Update 2008-01
// 0 !HISTORY 2012-02-16 [Philo] Changed to CCW
// 0 !HISTORY 2012-03-30 [PTadmin] Official Update 2012-01
// 
// 
// 1 16 0 0 0 6 0 0 0 1 0 0 0 6 4-4edge.dat
  [1,16,0,0,0,6,0,0,0,1,0,0,0,6, ldraw_lib__4_4edge(realsolid)],
// 1 16 0 -4 0 6 0 0 0 1 0 0 0 6 4-4edge.dat
  [1,16,0,-4,0,6,0,0,0,1,0,0,0,6, ldraw_lib__4_4edge(realsolid)],
// 1 16 0 0 0 6 0 0 0 -4 0 0 0 6 4-4cyli.dat
  [1,16,0,0,0,6,0,0,0,-4,0,0,0,6, ldraw_lib__4_4cyli(realsolid)],
// 1 16 0 -4 0 6 0 0 0 1 0 0 0 6 4-4disc.dat
  [1,16,0,-4,0,6,0,0,0,1,0,0,0,6, ldraw_lib__4_4disc(realsolid)],
];
module ldraw_lib__stud(step=0, col=false, unit=2/5, alt=false, line=0.2, solid=!$preview)
    makepoly(ldraw_lib__stud(solid), step=step, col=col, unit=unit, alt=alt, line=line, solid=solid);
ldraw_lib__stud(line=0.2);
// file: ../p/box5.scad
use <../lib.scad>
$fa=1; $fs=0.2;
function ldraw_lib__box5(realsolid=false) = [
// 0 Box with 5 Faces and All Edges
// 0 Name: box5.dat
// 0 Author: James Jessiman
// 0 !LDRAW_ORG Primitive UPDATE 2012-01
// 0 !LICENSE Licensed under CC BY 2.0 and CC BY 4.0 : see CAreadme.txt
// 
// 0 BFC CERTIFY CCW
  [0,"BFC","CERTIFY"],
  [0,"BFC","CCW"],
// 
// 0 !HISTORY 2002-04-03 [sbliss] Modified for BFC compliance
// 0 !HISTORY 2002-04-25 [PTadmin] Official Update 2002-02
// 0 !HISTORY 2007-06-24 [PTadmin] Header formatted for Contributor Agreement
// 0 !HISTORY 2008-07-01 [PTadmin] Official Update 2008-01
// 0 !HISTORY 2012-02-16 [Philo] Changed to CCW
// 0 !HISTORY 2012-03-30 [PTadmin] Official Update 2012-01
// 
// 
// 2 24 1 1 1 -1 1 1
  [2,24,1,1,1,-1,1,1],
// 2 24 -1 1 1 -1 1 -1
  [2,24,-1,1,1,-1,1,-1],
// 2 24 -1 1 -1 1 1 -1
  [2,24,-1,1,-1,1,1,-1],
// 2 24 1 1 -1 1 1 1
  [2,24,1,1,-1,1,1,1],
// 2 24 1 0 1 -1 0 1
  [2,24,1,0,1,-1,0,1],
// 2 24 -1 0 1 -1 0 -1
  [2,24,-1,0,1,-1,0,-1],
// 2 24 -1 0 -1 1 0 -1
  [2,24,-1,0,-1,1,0,-1],
// 2 24 1 0 -1 1 0 1
  [2,24,1,0,-1,1,0,1],
// 2 24 1 0 1 1 1 1
  [2,24,1,0,1,1,1,1],
// 2 24 -1 0 1 -1 1 1
  [2,24,-1,0,1,-1,1,1],
// 2 24 1 0 -1 1 1 -1
  [2,24,1,0,-1,1,1,-1],
// 2 24 -1 0 -1 -1 1 -1
  [2,24,-1,0,-1,-1,1,-1],
// 4 16 -1 1 1 1 1 1 1 1 -1 -1 1 -1
  [4,16,-1,1,1,1,1,1,1,1,-1,-1,1,-1],
// 4 16 -1 1 1 -1 0 1 1 0 1 1 1 1
  [4,16,-1,1,1,-1,0,1,1,0,1,1,1,1],
// 4 16 -1 1 -1 -1 0 -1 -1 0 1 -1 1 1
  [4,16,-1,1,-1,-1,0,-1,-1,0,1,-1,1,1],
// 4 16 1 1 -1 1 0 -1 -1 0 -1 -1 1 -1
  [4,16,1,1,-1,1,0,-1,-1,0,-1,-1,1,-1],
// 4 16 1 1 1 1 0 1 1 0 -1 1 1 -1
  [4,16,1,1,1,1,0,1,1,0,-1,1,1,-1],
];
module ldraw_lib__box5(step=0, col=false, unit=2/5, alt=false, line=0.2, solid=!$preview)
    makepoly(ldraw_lib__box5(solid), step=step, col=col, unit=unit, alt=alt, line=line, solid=solid);
ldraw_lib__box5(line=0.2);
// main file
use <../lib.scad>
use <../p/box5.scad>
use <../p/stud.scad>
$fa=1; $fs=0.2;
function ldraw_lib__14716(realsolid=false) = [
// 0 Brick  1 x  1 x  3
// 0 Name: 14716.dat
// 0 Author: Owen Burgoyne [C3POwen]
// 0 !LDRAW_ORG Part UPDATE 2014-01
// 0 !LICENSE Licensed under CC BY 2.0 and CC BY 4.0 : see CAreadme.txt
// 
// 0 BFC CERTIFY CCW
  [0,"BFC","CERTIFY"],
  [0,"BFC","CCW"],
// 
// 0 !HISTORY 2014-06-21 [PTadmin] Official Update 2014-01
// 
// 
// 4 16 -6 72 6 -6 72 -6 -10 72 -10 -10 72 10
  [4,16,-6,72,6,-6,72,-6,-10,72,-10,-10,72,10],
// 4 16 6 72 6 -6 72 6 -10 72 10 10 72 10
  [4,16,6,72,6,-6,72,6,-10,72,10,10,72,10],
// 4 16 6 72 -6 6 72 6 10 72 10 10 72 -10
  [4,16,6,72,-6,6,72,6,10,72,10,10,72,-10],
// 4 16 -6 72 -6 6 72 -6 10 72 -10 -10 72 -10
  [4,16,-6,72,-6,6,72,-6,10,72,-10,-10,72,-10],
// 0 BFC INVERTNEXT
  [0,"BFC","INVERTNEXT"],
// 1 16 0 72 0 6 0 0 0 -68 0 0 0 6 box5.dat
  [1,16,0,72,0,6,0,0,0,-68,0,0,0,6, ldraw_lib__box5(realsolid)],
// 1 16 0 72 0 10 0 0 0 -72 0 0 0 10 box5.dat
  [1,16,0,72,0,10,0,0,0,-72,0,0,0,10, ldraw_lib__box5(realsolid)],
// 1 16 0 0 0 1 0 0 0 1 0 0 0 1 stud.dat
  [1,16,0,0,0,1,0,0,0,1,0,0,0,1, ldraw_lib__stud(realsolid)],
];
module ldraw_lib__14716(step=0, col=false, unit=2/5, alt=false, line=0.2, solid=!$preview)
    makepoly(ldraw_lib__14716(solid), step=step, col=col, unit=unit, alt=alt, line=line, solid=solid);
ldraw_lib__14716(line=0.2);
